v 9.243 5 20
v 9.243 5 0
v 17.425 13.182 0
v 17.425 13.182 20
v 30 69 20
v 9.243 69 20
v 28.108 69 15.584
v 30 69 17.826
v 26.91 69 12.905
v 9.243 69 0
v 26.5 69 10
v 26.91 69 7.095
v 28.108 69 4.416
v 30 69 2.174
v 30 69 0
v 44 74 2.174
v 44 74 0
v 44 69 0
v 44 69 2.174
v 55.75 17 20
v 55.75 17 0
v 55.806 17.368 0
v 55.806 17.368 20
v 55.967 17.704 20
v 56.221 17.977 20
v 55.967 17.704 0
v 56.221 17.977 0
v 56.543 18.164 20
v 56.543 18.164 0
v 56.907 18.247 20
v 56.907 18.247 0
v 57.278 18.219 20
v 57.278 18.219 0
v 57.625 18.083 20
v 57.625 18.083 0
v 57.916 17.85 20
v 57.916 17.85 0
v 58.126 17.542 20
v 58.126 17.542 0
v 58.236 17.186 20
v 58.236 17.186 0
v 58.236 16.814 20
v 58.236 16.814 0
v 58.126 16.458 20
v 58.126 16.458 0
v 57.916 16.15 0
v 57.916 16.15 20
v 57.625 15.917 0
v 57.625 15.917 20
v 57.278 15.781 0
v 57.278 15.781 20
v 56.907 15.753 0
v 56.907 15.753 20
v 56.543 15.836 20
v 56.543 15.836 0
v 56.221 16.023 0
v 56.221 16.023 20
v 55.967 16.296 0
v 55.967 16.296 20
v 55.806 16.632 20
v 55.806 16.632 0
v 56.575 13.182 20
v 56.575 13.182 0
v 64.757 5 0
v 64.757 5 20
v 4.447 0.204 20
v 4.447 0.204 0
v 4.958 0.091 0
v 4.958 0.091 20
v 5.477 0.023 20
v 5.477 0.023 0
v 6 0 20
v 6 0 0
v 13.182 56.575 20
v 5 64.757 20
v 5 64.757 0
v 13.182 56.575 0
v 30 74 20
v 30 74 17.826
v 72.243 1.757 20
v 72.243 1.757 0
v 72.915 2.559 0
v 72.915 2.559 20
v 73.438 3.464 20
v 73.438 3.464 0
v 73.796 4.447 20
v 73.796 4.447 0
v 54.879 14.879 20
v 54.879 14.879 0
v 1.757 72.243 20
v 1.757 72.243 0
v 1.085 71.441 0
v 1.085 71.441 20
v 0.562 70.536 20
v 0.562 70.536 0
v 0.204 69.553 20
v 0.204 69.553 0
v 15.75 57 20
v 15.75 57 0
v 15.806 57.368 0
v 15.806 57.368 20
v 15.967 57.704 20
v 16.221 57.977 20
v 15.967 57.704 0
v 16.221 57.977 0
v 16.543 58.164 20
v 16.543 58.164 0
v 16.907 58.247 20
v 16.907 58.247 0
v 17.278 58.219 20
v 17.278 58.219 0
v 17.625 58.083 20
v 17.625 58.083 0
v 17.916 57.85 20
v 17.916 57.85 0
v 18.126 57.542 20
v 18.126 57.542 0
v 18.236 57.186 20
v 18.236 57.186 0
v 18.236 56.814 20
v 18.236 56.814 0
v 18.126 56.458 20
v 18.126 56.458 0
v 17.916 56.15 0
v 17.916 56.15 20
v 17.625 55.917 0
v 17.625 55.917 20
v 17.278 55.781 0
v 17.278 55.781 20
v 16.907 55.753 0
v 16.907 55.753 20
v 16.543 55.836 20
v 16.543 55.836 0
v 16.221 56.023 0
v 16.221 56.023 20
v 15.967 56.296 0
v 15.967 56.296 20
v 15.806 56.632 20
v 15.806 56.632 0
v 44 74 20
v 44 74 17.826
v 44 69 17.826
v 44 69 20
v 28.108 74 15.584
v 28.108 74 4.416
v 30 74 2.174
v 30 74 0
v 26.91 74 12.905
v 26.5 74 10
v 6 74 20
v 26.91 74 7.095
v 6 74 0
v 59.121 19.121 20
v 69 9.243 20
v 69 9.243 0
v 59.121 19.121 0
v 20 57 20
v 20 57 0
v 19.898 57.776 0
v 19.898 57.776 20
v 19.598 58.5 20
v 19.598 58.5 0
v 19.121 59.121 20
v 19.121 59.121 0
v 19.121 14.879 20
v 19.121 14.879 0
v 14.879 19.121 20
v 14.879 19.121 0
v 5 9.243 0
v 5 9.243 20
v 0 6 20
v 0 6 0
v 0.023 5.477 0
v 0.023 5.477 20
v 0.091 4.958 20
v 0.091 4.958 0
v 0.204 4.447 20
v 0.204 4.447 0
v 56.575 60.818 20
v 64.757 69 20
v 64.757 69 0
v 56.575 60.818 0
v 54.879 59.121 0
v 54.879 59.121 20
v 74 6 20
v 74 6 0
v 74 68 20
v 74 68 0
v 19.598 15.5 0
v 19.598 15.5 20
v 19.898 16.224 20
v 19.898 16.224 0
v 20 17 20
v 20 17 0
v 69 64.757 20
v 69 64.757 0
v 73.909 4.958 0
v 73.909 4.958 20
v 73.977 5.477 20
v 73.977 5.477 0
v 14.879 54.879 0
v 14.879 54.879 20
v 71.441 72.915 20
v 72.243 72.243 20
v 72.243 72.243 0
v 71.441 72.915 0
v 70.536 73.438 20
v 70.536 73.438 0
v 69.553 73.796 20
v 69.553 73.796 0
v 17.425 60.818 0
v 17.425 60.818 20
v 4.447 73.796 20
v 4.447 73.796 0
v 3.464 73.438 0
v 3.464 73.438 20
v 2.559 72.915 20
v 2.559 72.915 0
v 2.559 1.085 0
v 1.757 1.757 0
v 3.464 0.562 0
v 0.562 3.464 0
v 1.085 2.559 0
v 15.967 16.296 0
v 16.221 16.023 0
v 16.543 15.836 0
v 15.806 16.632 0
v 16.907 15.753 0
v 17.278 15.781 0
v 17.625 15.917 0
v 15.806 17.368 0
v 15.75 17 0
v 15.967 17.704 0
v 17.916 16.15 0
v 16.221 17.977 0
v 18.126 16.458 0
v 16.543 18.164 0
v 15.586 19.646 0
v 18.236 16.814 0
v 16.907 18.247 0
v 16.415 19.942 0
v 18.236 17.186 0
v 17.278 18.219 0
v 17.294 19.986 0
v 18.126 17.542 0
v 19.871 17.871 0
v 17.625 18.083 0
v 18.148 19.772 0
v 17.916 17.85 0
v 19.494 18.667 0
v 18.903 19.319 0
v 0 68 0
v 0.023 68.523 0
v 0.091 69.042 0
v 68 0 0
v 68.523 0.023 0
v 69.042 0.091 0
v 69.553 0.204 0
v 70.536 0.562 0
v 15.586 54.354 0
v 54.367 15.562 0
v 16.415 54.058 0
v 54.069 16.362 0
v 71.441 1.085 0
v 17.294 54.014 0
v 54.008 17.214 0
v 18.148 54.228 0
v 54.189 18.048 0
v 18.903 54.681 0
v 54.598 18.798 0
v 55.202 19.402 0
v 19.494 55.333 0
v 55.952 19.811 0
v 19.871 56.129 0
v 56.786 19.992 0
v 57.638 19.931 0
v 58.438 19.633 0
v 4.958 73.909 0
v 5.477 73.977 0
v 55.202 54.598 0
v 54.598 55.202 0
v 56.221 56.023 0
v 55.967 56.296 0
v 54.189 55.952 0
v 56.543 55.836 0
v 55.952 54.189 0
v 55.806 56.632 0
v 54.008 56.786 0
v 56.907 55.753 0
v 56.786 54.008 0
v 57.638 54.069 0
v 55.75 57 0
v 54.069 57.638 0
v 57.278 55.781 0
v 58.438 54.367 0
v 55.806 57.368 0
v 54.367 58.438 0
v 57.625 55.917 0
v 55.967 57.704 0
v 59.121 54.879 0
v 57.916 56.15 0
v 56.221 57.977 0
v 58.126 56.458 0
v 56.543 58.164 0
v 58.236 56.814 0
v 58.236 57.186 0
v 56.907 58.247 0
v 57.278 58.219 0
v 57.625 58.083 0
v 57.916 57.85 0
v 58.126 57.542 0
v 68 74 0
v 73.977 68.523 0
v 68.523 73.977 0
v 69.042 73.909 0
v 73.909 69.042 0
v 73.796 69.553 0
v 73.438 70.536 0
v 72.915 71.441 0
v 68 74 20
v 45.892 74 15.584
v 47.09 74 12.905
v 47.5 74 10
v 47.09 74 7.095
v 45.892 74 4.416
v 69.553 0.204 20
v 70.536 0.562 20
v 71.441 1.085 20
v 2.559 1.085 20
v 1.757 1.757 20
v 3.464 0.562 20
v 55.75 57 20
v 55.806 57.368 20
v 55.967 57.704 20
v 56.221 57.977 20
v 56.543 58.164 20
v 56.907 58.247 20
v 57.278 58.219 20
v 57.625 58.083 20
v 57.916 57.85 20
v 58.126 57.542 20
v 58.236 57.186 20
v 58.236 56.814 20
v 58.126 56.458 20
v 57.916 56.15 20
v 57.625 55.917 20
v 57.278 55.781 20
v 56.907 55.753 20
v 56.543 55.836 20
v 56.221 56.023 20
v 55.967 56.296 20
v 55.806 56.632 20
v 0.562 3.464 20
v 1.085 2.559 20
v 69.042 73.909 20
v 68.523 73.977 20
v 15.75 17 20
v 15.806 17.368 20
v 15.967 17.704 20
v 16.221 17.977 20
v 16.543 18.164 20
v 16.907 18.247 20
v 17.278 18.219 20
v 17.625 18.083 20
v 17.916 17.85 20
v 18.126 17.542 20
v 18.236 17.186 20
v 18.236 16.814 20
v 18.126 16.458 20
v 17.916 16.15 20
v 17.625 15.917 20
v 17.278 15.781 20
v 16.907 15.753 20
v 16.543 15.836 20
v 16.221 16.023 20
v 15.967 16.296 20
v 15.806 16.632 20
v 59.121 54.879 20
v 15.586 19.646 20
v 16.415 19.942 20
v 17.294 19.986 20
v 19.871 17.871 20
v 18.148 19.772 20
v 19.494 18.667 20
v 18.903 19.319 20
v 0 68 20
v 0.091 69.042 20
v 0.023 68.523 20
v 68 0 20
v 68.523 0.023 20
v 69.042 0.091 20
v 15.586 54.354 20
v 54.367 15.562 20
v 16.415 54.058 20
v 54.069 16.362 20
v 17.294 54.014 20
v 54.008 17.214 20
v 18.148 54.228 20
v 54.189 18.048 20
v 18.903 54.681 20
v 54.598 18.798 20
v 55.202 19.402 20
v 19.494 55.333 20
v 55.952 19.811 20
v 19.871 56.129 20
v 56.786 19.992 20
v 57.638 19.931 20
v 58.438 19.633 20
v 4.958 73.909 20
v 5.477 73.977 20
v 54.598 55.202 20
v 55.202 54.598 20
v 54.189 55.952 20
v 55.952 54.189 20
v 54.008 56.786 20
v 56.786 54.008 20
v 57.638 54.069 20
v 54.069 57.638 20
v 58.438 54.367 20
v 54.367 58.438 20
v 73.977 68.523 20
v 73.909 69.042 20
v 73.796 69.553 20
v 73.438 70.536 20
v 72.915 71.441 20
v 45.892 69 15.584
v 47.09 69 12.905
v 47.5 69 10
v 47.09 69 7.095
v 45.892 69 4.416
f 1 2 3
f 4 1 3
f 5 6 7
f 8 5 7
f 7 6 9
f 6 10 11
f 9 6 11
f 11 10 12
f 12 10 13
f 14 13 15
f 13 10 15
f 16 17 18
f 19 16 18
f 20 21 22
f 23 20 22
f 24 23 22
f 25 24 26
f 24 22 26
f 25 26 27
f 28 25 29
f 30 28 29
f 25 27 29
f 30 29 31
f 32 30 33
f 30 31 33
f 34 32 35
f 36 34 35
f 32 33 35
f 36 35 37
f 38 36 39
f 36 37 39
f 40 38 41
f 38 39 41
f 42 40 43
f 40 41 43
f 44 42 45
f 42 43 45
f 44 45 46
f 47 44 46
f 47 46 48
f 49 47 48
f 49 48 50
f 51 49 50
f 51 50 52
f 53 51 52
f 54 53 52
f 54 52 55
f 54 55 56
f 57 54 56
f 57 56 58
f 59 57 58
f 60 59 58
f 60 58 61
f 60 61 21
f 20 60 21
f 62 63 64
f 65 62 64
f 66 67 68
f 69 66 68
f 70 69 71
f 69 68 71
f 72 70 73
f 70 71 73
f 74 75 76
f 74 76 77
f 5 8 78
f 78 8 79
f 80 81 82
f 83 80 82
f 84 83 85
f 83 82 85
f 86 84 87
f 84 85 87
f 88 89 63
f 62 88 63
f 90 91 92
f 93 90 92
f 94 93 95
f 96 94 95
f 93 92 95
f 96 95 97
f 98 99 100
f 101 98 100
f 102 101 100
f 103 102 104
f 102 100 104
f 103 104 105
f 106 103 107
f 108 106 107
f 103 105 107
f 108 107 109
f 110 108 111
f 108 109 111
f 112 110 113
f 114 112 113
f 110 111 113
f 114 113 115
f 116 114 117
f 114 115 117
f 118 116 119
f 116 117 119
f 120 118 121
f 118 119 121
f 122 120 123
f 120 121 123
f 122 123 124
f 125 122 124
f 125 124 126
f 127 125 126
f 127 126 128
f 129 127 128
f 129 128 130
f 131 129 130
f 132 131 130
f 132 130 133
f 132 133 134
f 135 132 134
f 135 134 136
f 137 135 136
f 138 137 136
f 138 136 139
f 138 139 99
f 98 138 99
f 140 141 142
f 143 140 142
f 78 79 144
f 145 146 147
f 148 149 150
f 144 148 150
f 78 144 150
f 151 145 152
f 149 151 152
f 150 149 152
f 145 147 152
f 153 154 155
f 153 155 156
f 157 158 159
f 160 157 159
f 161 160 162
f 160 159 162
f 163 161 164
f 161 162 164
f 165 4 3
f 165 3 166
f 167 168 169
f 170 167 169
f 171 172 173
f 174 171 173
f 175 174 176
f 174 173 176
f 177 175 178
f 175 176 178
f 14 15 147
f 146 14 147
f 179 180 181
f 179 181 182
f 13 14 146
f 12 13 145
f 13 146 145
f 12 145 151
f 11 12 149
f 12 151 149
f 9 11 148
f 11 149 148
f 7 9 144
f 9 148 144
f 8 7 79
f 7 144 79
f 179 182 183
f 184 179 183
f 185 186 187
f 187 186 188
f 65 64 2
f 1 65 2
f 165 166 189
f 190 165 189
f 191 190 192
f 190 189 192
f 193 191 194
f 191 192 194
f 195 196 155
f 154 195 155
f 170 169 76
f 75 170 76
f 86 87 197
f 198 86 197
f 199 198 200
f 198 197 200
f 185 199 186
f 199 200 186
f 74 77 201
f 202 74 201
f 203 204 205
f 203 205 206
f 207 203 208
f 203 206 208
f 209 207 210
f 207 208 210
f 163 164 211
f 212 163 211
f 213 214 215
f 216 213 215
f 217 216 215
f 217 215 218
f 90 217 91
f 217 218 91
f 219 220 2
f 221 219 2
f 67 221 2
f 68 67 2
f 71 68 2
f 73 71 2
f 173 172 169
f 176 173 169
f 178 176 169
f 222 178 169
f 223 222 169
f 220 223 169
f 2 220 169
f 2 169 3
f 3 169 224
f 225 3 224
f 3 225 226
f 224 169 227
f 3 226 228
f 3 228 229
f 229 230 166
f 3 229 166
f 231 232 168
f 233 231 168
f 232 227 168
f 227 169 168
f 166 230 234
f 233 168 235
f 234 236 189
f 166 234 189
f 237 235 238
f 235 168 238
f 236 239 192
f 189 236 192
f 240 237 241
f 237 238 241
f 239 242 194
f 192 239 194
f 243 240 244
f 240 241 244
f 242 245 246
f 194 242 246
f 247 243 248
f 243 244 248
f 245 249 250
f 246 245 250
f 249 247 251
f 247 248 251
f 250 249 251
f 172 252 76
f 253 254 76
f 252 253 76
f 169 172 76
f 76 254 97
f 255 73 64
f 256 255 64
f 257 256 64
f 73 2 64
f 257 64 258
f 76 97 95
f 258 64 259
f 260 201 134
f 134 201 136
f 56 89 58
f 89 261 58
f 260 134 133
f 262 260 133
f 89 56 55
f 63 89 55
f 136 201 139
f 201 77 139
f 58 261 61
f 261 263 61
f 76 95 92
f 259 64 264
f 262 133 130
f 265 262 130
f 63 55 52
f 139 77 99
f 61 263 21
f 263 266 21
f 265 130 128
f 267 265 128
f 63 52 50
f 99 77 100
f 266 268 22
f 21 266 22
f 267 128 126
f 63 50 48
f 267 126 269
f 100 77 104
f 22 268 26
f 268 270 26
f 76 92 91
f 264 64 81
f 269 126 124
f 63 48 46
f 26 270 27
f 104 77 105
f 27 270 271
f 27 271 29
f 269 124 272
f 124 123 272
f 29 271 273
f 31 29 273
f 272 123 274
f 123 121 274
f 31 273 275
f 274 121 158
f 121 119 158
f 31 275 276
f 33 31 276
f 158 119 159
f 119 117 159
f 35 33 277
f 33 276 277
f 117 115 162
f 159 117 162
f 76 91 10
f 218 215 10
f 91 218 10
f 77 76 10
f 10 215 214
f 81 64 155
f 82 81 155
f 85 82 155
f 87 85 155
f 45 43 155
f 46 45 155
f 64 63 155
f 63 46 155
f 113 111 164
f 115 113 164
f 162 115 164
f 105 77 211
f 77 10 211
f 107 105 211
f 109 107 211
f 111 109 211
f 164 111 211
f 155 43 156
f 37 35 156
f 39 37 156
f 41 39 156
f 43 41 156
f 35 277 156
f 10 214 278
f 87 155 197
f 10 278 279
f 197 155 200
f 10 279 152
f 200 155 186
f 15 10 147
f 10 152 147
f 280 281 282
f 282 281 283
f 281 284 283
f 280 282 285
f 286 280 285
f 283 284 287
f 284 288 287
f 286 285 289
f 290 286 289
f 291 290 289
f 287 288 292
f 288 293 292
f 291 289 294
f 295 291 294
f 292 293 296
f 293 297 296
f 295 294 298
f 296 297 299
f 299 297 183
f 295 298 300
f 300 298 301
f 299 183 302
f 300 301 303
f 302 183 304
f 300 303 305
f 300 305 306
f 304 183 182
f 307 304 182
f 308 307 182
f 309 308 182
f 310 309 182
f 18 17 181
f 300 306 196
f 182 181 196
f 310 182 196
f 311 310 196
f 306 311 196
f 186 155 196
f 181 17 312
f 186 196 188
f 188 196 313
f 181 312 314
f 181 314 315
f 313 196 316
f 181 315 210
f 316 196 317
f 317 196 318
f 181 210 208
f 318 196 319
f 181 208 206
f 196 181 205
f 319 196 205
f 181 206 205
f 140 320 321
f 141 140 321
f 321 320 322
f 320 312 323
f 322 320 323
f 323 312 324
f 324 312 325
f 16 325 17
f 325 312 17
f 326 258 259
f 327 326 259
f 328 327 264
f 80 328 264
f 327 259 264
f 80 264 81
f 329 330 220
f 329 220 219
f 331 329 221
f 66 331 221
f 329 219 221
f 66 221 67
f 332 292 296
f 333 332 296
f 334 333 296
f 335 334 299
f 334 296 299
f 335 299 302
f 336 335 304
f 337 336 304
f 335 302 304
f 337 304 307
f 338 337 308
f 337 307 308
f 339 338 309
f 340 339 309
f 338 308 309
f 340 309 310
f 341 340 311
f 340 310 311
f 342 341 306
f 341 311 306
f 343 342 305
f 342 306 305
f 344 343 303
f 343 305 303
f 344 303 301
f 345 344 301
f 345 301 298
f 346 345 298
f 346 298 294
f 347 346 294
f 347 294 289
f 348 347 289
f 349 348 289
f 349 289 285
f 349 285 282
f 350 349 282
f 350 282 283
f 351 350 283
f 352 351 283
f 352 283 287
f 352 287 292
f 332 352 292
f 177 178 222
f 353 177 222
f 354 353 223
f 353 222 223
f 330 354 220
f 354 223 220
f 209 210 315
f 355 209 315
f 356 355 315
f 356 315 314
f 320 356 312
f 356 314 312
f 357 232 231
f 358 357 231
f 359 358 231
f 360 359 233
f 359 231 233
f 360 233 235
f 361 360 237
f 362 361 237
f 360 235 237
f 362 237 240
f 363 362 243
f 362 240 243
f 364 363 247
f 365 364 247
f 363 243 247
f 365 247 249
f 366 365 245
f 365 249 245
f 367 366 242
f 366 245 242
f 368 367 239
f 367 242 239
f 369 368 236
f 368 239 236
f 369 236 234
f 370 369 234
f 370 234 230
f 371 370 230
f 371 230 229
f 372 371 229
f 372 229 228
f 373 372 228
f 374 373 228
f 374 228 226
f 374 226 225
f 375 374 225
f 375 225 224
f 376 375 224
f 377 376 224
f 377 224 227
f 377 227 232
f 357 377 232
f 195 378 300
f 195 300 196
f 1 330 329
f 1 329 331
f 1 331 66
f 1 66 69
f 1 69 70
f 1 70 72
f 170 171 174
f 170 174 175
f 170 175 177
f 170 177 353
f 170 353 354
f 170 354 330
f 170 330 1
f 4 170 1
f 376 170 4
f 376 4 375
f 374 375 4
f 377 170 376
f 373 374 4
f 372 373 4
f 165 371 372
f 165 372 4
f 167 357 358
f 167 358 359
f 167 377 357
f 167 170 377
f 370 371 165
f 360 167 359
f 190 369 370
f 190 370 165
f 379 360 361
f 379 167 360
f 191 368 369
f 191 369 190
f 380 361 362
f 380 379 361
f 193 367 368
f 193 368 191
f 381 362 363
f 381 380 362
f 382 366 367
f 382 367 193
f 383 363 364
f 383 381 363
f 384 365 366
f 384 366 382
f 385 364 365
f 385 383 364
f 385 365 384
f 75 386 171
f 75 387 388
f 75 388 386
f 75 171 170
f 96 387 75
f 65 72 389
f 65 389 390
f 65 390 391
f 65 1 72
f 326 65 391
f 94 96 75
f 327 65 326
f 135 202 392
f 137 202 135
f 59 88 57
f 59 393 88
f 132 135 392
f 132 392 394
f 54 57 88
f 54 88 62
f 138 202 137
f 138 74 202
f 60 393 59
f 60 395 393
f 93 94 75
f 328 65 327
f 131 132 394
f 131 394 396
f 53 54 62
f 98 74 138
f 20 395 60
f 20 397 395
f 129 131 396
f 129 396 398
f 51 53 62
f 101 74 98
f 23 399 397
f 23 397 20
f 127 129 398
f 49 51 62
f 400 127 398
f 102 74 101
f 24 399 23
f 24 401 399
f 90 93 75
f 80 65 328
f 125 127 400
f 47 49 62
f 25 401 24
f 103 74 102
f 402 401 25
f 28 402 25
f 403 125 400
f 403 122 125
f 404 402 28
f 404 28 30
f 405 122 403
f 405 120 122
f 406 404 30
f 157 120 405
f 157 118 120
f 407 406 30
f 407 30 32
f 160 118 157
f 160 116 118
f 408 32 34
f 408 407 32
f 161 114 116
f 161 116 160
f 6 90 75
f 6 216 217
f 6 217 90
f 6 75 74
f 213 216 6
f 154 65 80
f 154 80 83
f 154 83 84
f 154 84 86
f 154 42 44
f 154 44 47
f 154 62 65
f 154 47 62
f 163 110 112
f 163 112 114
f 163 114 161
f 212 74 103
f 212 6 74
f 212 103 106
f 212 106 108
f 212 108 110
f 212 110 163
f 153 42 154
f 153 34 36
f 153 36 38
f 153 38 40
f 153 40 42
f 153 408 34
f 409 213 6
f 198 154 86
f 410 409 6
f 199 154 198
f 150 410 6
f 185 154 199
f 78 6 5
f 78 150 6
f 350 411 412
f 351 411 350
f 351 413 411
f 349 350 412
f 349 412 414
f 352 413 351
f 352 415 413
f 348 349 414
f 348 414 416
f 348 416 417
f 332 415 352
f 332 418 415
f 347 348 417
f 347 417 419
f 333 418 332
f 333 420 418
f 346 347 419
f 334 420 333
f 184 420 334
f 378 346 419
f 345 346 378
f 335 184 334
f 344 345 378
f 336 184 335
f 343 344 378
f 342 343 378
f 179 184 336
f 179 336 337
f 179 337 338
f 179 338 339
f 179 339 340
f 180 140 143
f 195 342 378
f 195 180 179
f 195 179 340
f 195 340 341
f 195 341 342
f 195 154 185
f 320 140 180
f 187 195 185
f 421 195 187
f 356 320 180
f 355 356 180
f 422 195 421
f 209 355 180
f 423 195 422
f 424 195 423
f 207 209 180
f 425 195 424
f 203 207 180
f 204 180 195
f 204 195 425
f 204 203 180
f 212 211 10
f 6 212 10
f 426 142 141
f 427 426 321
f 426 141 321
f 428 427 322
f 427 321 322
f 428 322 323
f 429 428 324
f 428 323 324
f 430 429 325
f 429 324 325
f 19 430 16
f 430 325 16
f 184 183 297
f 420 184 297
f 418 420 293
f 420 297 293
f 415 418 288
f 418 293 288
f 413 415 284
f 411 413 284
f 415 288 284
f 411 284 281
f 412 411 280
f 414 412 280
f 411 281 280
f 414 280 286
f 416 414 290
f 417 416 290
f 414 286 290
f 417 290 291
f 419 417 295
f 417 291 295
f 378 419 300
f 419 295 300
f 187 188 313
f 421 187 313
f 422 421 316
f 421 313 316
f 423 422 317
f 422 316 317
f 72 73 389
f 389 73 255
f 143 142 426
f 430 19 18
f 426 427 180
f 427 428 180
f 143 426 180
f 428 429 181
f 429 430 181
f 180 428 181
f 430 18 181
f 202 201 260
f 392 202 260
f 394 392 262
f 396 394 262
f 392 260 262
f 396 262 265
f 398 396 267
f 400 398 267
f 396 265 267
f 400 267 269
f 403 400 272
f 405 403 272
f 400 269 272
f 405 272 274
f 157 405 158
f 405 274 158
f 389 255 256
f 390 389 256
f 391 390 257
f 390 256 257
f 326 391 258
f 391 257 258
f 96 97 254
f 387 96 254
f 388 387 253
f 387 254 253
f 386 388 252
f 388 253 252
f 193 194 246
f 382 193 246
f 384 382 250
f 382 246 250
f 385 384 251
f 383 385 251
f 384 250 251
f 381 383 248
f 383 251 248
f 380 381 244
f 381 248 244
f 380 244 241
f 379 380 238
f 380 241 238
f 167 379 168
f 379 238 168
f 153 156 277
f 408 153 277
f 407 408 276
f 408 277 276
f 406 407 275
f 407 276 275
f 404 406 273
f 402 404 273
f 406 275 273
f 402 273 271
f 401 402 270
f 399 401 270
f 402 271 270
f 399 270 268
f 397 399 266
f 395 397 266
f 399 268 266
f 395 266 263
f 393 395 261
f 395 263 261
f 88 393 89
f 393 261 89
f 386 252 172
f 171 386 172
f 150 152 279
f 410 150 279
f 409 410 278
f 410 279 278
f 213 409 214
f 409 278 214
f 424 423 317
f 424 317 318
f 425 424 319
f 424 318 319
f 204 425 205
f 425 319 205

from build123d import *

# Parameters (mm, degrees)
F1_DEPTH = 20
F3_DEPTH = 25
F6_D     = 2.5


# Not quite as in the source:
# - a feature names something its author has since deleted; it is built from what else it names


with BuildPart() as f1:
    # F0 (on Top) → F1 (new body)
    with BuildSketch(Plane.XY):
        with BuildLine():
            Line((0, 68), (0, 6))
            ThreePointArc((0, 6), (0.0513308318, 5.2168428467), (0.2044450423, 4.4470857294))
            Line((0.2044450423, 4.4470857294), (5, 9.2426406871))
            Line((5, 9.2426406871), (5, 24.5))
            Line((5, 24.5), (5, 49))
            Line((5, 49), (5, 64.7573593129))
            Line((5, 64.7573593129), (0.2044450423, 69.5529142706))
            ThreePointArc((0.2044450423, 69.5529142706), (0.0513308318, 68.7831571533), (0, 68))
        make_face()
        with BuildLine():
            Line((5, 9.2426406871), (0.2044450423, 4.4470857294))
            ThreePointArc((0.2044450423, 4.4470857294), (0.8038475773, 3), (1.7573593129, 1.7573593129))
            Line((1.7573593129, 1.7573593129), (5.2928932188, 5.2928932188))
            ThreePointArc((5.2928932188, 5.2928932188), (5.0761204675, 5.6173165676), (5, 6))
            Line((5, 6), (5, 9.2426406871))
        make_face()
        with BuildLine():
            ThreePointArc((1.7573593129, 72.2426406871), (0.8038475773, 71), (0.2044450423, 69.5529142706))
            Line((0.2044450423, 69.5529142706), (5, 64.7573593129))
            Line((5, 64.7573593129), (5, 68))
            ThreePointArc((5, 68), (5.0761204675, 68.3826834324), (5.2928932188, 68.7071067812))
            Line((5.2928932188, 68.7071067812), (1.7573593129, 72.2426406871))
        make_face()
        with BuildLine():
            Line((5.2928932188, 5.2928932188), (1.7573593129, 1.7573593129))
            ThreePointArc((1.7573593129, 1.7573593129), (3, 0.8038475773), (4.4470857294, 0.2044450423))
            Line((4.4470857294, 0.2044450423), (9.2426406871, 5))
            Line((9.2426406871, 5), (6, 5))
            ThreePointArc((6, 5), (5.6173165676, 5.0761204675), (5.2928932188, 5.2928932188))
        make_face()
        with BuildLine():
            Line((14.8786796564, 19.1213203436), (5, 9.2426406871))
            Line((5, 9.2426406871), (5, 6))
            ThreePointArc((5, 6), (5.0761204675, 5.6173165676), (5.2928932188, 5.2928932188))
            Line((5.2928932188, 5.2928932188), (14.8786796564, 14.8786796564))
            ThreePointArc((14.8786796564, 14.8786796564), (14, 17), (14.8786796564, 19.1213203436))
        make_face()
        with BuildLine():
            ThreePointArc((4.4470857294, 73.7955549577), (3, 73.1961524227), (1.7573593129, 72.2426406871))
            Line((1.7573593129, 72.2426406871), (5.2928932188, 68.7071067812))
            ThreePointArc((5.2928932188, 68.7071067812), (5.6173165676, 68.9238795325), (6, 69))
            Line((6, 69), (9.2426406871, 69))
            Line((9.2426406871, 69), (4.4470857294, 73.7955549577))
        make_face()
        with BuildLine():
            Line((5, 68), (5, 64.7573593129))
            Line((5, 64.7573593129), (13.1819805153, 56.5753787975))
            Line((13.1819805153, 56.5753787975), (14.8786796564, 54.8786796564))
            ThreePointArc((14.8786796564, 54.8786796564), (14, 57), (14.8786796564, 59.1213203436))
            Line((14.8786796564, 59.1213203436), (5.2928932188, 68.7071067812))
            ThreePointArc((5.2928932188, 68.7071067812), (5.0761204675, 68.3826834324), (5, 68))
        make_face()
        with BuildLine():
            Line((9.2426406871, 5), (4.4470857294, 0.2044450423))
            ThreePointArc((4.4470857294, 0.2044450423), (5.2168428467, 0.0513308318), (6, 0))
            Line((6, 0), (37, 0))
            Line((37, 0), (68, 0))
            ThreePointArc((68, 0), (68.7831571533, 0.0513308318), (69.5529142706, 0.2044450423))
            Line((69.5529142706, 0.2044450423), (64.7573593129, 5))
            Line((64.7573593129, 5), (37, 5))
            Line((37, 5), (30, 5))
            Line((30, 5), (9.2426406871, 5))
        make_face()
        with BuildLine():
            Line((14.8786796564, 14.8786796564), (5.2928932188, 5.2928932188))
            ThreePointArc((5.2928932188, 5.2928932188), (5.6173165676, 5.0761204675), (6, 5))
            Line((6, 5), (9.2426406871, 5))
            Line((9.2426406871, 5), (17.4246212025, 13.1819805153))
            Line((17.4246212025, 13.1819805153), (19.1213203436, 14.8786796564))
            ThreePointArc((19.1213203436, 14.8786796564), (17, 14), (14.8786796564, 14.8786796564))
        make_face()
        with BuildLine():
            ThreePointArc((20, 17), (18.1480502971, 19.7716385975), (14.8786796564, 19.1213203436))
            ThreePointArc((14.8786796564, 19.1213203436), (14, 17), (14.8786796564, 14.8786796564))
            ThreePointArc((14.8786796564, 14.8786796564), (17, 14), (19.1213203436, 14.8786796564))
            ThreePointArc((19.1213203436, 14.8786796564), (19.7716385975, 15.8519497029), (20, 17))
        make_face()
        with BuildLine():
            ThreePointArc((6, 74), (5.2168428467, 73.9486691682), (4.4470857294, 73.7955549577))
            Line((4.4470857294, 73.7955549577), (9.2426406871, 69))
            Line((9.2426406871, 69), (30, 69))
            Line((30, 69), (30, 74))
            Line((30, 74), (6, 74))
        make_face()
        with BuildLine():
            ThreePointArc((6, 69), (5.6173165676, 68.9238795325), (5.2928932188, 68.7071067812))
            Line((5.2928932188, 68.7071067812), (14.8786796564, 59.1213203436))
            ThreePointArc((14.8786796564, 59.1213203436), (17, 60), (19.1213203436, 59.1213203436))
            Line((19.1213203436, 59.1213203436), (17.4246212025, 60.8180194847))
            Line((17.4246212025, 60.8180194847), (9.2426406871, 69))
            Line((9.2426406871, 69), (6, 69))
        make_face()
        with BuildLine():
            ThreePointArc((19.1213203436, 59.1213203436), (17, 60), (14.8786796564, 59.1213203436))
            ThreePointArc((14.8786796564, 59.1213203436), (14, 57), (14.8786796564, 54.8786796564))
            ThreePointArc((14.8786796564, 54.8786796564), (18.1480502971, 54.2283614025), (20, 57))
            ThreePointArc((20, 57), (19.7716385975, 58.1480502971), (19.1213203436, 59.1213203436))
        make_face()
        with BuildLine():
            Line((64.7573593129, 5), (69.5529142706, 0.2044450423))
            ThreePointArc((69.5529142706, 0.2044450423), (71, 0.8038475773), (72.2426406871, 1.7573593129))
            Line((72.2426406871, 1.7573593129), (68.7071067812, 5.2928932188))
            ThreePointArc((68.7071067812, 5.2928932188), (68.3826834324, 5.0761204675), (68, 5))
            Line((68, 5), (64.7573593129, 5))
        make_face()
        with BuildLine():
            Line((56.5753787975, 13.1819805153), (64.7573593129, 5))
            Line((64.7573593129, 5), (68, 5))
            ThreePointArc((68, 5), (68.3826834324, 5.0761204675), (68.7071067812, 5.2928932188))
            Line((68.7071067812, 5.2928932188), (59.1213203436, 14.8786796564))
            ThreePointArc((59.1213203436, 14.8786796564), (57, 14), (54.8786796564, 14.8786796564))
            Line((54.8786796564, 14.8786796564), (56.5753787975, 13.1819805153))
        make_face()
        with BuildLine():
            Line((68.7071067812, 5.2928932188), (72.2426406871, 1.7573593129))
            ThreePointArc((72.2426406871, 1.7573593129), (73.1961524227, 3), (73.7955549577, 4.4470857294))
            Line((73.7955549577, 4.4470857294), (69, 9.2426406871))
            Line((69, 9.2426406871), (69, 6))
            ThreePointArc((69, 6), (68.9238795325, 5.6173165676), (68.7071067812, 5.2928932188))
        make_face()
        with BuildLine():
            Line((69, 9.2426406871), (73.7955549577, 4.4470857294))
            ThreePointArc((73.7955549577, 4.4470857294), (73.9486691682, 5.2168428467), (74, 6))
            Line((74, 6), (74, 68))
            ThreePointArc((74, 68), (73.9486691682, 68.7831571533), (73.7955549577, 69.5529142706))
            Line((73.7955549577, 69.5529142706), (69, 64.7573593129))
            Line((69, 64.7573593129), (69, 49))
            Line((69, 49), (69, 24.5))
            Line((69, 24.5), (69, 9.2426406871))
        make_face()
        with BuildLine():
            Line((59.1213203436, 14.8786796564), (68.7071067812, 5.2928932188))
            ThreePointArc((68.7071067812, 5.2928932188), (68.9238795325, 5.6173165676), (69, 6))
            Line((69, 6), (69, 9.2426406871))
            Line((69, 9.2426406871), (59.1213203436, 19.1213203436))
            ThreePointArc((59.1213203436, 19.1213203436), (59.7716385975, 18.1480502971), (60, 17))
            ThreePointArc((60, 17), (59.7716385975, 15.8519497029), (59.1213203436, 14.8786796564))
        make_face()
        with BuildLine():
            ThreePointArc((59.1213203436, 19.1213203436), (54.8786796564, 19.1213203436), (54.8786796564, 14.8786796564))
            ThreePointArc((54.8786796564, 14.8786796564), (57, 14), (59.1213203436, 14.8786796564))
            ThreePointArc((59.1213203436, 14.8786796564), (59.7716385975, 15.8519497029), (60, 17))
            ThreePointArc((60, 17), (59.7716385975, 18.1480502971), (59.1213203436, 19.1213203436))
        make_face()
        with BuildLine():
            Line((69, 64.7573593129), (73.7955549577, 69.5529142706))
            ThreePointArc((73.7955549577, 69.5529142706), (73.1961524227, 71), (72.2426406871, 72.2426406871))
            Line((72.2426406871, 72.2426406871), (68.7071067812, 68.7071067812))
            ThreePointArc((68.7071067812, 68.7071067812), (68.9238795325, 68.3826834324), (69, 68))
            Line((69, 68), (69, 64.7573593129))
        make_face()
        with BuildLine():
            Line((68.7071067812, 68.7071067812), (72.2426406871, 72.2426406871))
            ThreePointArc((72.2426406871, 72.2426406871), (71, 73.1961524227), (69.5529142706, 73.7955549577))
            Line((69.5529142706, 73.7955549577), (64.7573593129, 69))
            Line((64.7573593129, 69), (68, 69))
            ThreePointArc((68, 69), (68.3826834324, 68.9238795325), (68.7071067812, 68.7071067812))
        make_face()
        with BuildLine():
            Line((59.1213203436, 54.8786796564), (69, 64.7573593129))
            Line((69, 64.7573593129), (69, 68))
            ThreePointArc((69, 68), (68.9238795325, 68.3826834324), (68.7071067812, 68.7071067812))
            Line((68.7071067812, 68.7071067812), (59.1213203436, 59.1213203436))
            ThreePointArc((59.1213203436, 59.1213203436), (59.7716385975, 58.1480502971), (60, 57))
            ThreePointArc((60, 57), (59.7716385975, 55.8519497029), (59.1213203436, 54.8786796564))
        make_face()
        with BuildLine():
            Line((64.7573593129, 69), (69.5529142706, 73.7955549577))
            ThreePointArc((69.5529142706, 73.7955549577), (68.7831571533, 73.9486691682), (68, 74))
            Line((68, 74), (44, 74))
            Line((44, 74), (44, 69))
            Line((44, 69), (64.7573593129, 69))
        make_face()
        with BuildLine():
            Line((59.1213203436, 59.1213203436), (68.7071067812, 68.7071067812))
            ThreePointArc((68.7071067812, 68.7071067812), (68.3826834324, 68.9238795325), (68, 69))
            Line((68, 69), (64.7573593129, 69))
            Line((64.7573593129, 69), (56.5753787975, 60.8180194847))
            Line((56.5753787975, 60.8180194847), (54.8786796564, 59.1213203436))
            ThreePointArc((54.8786796564, 59.1213203436), (57, 60), (59.1213203436, 59.1213203436))
        make_face()
        with BuildLine():
            ThreePointArc((54.8786796564, 59.1213203436), (54.8786796564, 54.8786796564), (59.1213203436, 54.8786796564))
            ThreePointArc((59.1213203436, 54.8786796564), (59.7716385975, 55.8519497029), (60, 57))
            ThreePointArc((60, 57), (59.7716385975, 58.1480502971), (59.1213203436, 59.1213203436))
            ThreePointArc((59.1213203436, 59.1213203436), (57, 60), (54.8786796564, 59.1213203436))
        make_face()
    extrude(amount=F1_DEPTH)


with BuildPart() as f3:
    # F2 (on face) → F3 (new body)
    with BuildSketch(Plane(origin=(0, 74, 0), x_dir=(-1, 0, 0), z_dir=(0, 1, 0))):
        with BuildLine():
            ThreePointArc((-26.5, 10), (-37, 20.5), (-47.5, 10))
            Line((-47.5, 10), (-26.5, 10))
        make_face()
        with BuildLine():
            Line((-26.5, 10), (-47.5, 10))
            ThreePointArc((-47.5, 10), (-37, -0.5), (-26.5, 10))
        make_face()
    extrude(amount=-F3_DEPTH)


with BuildPart() as f1_1:
    add(f1.part)

    # F4: cut F3
    add(f3.part, mode=Mode.SUBTRACT)

    # F6 (through all)
    with Locations(Plane.XY.offset(20)):
        with Locations((17, 57), (57, 57), (57, 17), (17, 17)):
            Hole(F6_D / 2)


solid = f1_1.part
